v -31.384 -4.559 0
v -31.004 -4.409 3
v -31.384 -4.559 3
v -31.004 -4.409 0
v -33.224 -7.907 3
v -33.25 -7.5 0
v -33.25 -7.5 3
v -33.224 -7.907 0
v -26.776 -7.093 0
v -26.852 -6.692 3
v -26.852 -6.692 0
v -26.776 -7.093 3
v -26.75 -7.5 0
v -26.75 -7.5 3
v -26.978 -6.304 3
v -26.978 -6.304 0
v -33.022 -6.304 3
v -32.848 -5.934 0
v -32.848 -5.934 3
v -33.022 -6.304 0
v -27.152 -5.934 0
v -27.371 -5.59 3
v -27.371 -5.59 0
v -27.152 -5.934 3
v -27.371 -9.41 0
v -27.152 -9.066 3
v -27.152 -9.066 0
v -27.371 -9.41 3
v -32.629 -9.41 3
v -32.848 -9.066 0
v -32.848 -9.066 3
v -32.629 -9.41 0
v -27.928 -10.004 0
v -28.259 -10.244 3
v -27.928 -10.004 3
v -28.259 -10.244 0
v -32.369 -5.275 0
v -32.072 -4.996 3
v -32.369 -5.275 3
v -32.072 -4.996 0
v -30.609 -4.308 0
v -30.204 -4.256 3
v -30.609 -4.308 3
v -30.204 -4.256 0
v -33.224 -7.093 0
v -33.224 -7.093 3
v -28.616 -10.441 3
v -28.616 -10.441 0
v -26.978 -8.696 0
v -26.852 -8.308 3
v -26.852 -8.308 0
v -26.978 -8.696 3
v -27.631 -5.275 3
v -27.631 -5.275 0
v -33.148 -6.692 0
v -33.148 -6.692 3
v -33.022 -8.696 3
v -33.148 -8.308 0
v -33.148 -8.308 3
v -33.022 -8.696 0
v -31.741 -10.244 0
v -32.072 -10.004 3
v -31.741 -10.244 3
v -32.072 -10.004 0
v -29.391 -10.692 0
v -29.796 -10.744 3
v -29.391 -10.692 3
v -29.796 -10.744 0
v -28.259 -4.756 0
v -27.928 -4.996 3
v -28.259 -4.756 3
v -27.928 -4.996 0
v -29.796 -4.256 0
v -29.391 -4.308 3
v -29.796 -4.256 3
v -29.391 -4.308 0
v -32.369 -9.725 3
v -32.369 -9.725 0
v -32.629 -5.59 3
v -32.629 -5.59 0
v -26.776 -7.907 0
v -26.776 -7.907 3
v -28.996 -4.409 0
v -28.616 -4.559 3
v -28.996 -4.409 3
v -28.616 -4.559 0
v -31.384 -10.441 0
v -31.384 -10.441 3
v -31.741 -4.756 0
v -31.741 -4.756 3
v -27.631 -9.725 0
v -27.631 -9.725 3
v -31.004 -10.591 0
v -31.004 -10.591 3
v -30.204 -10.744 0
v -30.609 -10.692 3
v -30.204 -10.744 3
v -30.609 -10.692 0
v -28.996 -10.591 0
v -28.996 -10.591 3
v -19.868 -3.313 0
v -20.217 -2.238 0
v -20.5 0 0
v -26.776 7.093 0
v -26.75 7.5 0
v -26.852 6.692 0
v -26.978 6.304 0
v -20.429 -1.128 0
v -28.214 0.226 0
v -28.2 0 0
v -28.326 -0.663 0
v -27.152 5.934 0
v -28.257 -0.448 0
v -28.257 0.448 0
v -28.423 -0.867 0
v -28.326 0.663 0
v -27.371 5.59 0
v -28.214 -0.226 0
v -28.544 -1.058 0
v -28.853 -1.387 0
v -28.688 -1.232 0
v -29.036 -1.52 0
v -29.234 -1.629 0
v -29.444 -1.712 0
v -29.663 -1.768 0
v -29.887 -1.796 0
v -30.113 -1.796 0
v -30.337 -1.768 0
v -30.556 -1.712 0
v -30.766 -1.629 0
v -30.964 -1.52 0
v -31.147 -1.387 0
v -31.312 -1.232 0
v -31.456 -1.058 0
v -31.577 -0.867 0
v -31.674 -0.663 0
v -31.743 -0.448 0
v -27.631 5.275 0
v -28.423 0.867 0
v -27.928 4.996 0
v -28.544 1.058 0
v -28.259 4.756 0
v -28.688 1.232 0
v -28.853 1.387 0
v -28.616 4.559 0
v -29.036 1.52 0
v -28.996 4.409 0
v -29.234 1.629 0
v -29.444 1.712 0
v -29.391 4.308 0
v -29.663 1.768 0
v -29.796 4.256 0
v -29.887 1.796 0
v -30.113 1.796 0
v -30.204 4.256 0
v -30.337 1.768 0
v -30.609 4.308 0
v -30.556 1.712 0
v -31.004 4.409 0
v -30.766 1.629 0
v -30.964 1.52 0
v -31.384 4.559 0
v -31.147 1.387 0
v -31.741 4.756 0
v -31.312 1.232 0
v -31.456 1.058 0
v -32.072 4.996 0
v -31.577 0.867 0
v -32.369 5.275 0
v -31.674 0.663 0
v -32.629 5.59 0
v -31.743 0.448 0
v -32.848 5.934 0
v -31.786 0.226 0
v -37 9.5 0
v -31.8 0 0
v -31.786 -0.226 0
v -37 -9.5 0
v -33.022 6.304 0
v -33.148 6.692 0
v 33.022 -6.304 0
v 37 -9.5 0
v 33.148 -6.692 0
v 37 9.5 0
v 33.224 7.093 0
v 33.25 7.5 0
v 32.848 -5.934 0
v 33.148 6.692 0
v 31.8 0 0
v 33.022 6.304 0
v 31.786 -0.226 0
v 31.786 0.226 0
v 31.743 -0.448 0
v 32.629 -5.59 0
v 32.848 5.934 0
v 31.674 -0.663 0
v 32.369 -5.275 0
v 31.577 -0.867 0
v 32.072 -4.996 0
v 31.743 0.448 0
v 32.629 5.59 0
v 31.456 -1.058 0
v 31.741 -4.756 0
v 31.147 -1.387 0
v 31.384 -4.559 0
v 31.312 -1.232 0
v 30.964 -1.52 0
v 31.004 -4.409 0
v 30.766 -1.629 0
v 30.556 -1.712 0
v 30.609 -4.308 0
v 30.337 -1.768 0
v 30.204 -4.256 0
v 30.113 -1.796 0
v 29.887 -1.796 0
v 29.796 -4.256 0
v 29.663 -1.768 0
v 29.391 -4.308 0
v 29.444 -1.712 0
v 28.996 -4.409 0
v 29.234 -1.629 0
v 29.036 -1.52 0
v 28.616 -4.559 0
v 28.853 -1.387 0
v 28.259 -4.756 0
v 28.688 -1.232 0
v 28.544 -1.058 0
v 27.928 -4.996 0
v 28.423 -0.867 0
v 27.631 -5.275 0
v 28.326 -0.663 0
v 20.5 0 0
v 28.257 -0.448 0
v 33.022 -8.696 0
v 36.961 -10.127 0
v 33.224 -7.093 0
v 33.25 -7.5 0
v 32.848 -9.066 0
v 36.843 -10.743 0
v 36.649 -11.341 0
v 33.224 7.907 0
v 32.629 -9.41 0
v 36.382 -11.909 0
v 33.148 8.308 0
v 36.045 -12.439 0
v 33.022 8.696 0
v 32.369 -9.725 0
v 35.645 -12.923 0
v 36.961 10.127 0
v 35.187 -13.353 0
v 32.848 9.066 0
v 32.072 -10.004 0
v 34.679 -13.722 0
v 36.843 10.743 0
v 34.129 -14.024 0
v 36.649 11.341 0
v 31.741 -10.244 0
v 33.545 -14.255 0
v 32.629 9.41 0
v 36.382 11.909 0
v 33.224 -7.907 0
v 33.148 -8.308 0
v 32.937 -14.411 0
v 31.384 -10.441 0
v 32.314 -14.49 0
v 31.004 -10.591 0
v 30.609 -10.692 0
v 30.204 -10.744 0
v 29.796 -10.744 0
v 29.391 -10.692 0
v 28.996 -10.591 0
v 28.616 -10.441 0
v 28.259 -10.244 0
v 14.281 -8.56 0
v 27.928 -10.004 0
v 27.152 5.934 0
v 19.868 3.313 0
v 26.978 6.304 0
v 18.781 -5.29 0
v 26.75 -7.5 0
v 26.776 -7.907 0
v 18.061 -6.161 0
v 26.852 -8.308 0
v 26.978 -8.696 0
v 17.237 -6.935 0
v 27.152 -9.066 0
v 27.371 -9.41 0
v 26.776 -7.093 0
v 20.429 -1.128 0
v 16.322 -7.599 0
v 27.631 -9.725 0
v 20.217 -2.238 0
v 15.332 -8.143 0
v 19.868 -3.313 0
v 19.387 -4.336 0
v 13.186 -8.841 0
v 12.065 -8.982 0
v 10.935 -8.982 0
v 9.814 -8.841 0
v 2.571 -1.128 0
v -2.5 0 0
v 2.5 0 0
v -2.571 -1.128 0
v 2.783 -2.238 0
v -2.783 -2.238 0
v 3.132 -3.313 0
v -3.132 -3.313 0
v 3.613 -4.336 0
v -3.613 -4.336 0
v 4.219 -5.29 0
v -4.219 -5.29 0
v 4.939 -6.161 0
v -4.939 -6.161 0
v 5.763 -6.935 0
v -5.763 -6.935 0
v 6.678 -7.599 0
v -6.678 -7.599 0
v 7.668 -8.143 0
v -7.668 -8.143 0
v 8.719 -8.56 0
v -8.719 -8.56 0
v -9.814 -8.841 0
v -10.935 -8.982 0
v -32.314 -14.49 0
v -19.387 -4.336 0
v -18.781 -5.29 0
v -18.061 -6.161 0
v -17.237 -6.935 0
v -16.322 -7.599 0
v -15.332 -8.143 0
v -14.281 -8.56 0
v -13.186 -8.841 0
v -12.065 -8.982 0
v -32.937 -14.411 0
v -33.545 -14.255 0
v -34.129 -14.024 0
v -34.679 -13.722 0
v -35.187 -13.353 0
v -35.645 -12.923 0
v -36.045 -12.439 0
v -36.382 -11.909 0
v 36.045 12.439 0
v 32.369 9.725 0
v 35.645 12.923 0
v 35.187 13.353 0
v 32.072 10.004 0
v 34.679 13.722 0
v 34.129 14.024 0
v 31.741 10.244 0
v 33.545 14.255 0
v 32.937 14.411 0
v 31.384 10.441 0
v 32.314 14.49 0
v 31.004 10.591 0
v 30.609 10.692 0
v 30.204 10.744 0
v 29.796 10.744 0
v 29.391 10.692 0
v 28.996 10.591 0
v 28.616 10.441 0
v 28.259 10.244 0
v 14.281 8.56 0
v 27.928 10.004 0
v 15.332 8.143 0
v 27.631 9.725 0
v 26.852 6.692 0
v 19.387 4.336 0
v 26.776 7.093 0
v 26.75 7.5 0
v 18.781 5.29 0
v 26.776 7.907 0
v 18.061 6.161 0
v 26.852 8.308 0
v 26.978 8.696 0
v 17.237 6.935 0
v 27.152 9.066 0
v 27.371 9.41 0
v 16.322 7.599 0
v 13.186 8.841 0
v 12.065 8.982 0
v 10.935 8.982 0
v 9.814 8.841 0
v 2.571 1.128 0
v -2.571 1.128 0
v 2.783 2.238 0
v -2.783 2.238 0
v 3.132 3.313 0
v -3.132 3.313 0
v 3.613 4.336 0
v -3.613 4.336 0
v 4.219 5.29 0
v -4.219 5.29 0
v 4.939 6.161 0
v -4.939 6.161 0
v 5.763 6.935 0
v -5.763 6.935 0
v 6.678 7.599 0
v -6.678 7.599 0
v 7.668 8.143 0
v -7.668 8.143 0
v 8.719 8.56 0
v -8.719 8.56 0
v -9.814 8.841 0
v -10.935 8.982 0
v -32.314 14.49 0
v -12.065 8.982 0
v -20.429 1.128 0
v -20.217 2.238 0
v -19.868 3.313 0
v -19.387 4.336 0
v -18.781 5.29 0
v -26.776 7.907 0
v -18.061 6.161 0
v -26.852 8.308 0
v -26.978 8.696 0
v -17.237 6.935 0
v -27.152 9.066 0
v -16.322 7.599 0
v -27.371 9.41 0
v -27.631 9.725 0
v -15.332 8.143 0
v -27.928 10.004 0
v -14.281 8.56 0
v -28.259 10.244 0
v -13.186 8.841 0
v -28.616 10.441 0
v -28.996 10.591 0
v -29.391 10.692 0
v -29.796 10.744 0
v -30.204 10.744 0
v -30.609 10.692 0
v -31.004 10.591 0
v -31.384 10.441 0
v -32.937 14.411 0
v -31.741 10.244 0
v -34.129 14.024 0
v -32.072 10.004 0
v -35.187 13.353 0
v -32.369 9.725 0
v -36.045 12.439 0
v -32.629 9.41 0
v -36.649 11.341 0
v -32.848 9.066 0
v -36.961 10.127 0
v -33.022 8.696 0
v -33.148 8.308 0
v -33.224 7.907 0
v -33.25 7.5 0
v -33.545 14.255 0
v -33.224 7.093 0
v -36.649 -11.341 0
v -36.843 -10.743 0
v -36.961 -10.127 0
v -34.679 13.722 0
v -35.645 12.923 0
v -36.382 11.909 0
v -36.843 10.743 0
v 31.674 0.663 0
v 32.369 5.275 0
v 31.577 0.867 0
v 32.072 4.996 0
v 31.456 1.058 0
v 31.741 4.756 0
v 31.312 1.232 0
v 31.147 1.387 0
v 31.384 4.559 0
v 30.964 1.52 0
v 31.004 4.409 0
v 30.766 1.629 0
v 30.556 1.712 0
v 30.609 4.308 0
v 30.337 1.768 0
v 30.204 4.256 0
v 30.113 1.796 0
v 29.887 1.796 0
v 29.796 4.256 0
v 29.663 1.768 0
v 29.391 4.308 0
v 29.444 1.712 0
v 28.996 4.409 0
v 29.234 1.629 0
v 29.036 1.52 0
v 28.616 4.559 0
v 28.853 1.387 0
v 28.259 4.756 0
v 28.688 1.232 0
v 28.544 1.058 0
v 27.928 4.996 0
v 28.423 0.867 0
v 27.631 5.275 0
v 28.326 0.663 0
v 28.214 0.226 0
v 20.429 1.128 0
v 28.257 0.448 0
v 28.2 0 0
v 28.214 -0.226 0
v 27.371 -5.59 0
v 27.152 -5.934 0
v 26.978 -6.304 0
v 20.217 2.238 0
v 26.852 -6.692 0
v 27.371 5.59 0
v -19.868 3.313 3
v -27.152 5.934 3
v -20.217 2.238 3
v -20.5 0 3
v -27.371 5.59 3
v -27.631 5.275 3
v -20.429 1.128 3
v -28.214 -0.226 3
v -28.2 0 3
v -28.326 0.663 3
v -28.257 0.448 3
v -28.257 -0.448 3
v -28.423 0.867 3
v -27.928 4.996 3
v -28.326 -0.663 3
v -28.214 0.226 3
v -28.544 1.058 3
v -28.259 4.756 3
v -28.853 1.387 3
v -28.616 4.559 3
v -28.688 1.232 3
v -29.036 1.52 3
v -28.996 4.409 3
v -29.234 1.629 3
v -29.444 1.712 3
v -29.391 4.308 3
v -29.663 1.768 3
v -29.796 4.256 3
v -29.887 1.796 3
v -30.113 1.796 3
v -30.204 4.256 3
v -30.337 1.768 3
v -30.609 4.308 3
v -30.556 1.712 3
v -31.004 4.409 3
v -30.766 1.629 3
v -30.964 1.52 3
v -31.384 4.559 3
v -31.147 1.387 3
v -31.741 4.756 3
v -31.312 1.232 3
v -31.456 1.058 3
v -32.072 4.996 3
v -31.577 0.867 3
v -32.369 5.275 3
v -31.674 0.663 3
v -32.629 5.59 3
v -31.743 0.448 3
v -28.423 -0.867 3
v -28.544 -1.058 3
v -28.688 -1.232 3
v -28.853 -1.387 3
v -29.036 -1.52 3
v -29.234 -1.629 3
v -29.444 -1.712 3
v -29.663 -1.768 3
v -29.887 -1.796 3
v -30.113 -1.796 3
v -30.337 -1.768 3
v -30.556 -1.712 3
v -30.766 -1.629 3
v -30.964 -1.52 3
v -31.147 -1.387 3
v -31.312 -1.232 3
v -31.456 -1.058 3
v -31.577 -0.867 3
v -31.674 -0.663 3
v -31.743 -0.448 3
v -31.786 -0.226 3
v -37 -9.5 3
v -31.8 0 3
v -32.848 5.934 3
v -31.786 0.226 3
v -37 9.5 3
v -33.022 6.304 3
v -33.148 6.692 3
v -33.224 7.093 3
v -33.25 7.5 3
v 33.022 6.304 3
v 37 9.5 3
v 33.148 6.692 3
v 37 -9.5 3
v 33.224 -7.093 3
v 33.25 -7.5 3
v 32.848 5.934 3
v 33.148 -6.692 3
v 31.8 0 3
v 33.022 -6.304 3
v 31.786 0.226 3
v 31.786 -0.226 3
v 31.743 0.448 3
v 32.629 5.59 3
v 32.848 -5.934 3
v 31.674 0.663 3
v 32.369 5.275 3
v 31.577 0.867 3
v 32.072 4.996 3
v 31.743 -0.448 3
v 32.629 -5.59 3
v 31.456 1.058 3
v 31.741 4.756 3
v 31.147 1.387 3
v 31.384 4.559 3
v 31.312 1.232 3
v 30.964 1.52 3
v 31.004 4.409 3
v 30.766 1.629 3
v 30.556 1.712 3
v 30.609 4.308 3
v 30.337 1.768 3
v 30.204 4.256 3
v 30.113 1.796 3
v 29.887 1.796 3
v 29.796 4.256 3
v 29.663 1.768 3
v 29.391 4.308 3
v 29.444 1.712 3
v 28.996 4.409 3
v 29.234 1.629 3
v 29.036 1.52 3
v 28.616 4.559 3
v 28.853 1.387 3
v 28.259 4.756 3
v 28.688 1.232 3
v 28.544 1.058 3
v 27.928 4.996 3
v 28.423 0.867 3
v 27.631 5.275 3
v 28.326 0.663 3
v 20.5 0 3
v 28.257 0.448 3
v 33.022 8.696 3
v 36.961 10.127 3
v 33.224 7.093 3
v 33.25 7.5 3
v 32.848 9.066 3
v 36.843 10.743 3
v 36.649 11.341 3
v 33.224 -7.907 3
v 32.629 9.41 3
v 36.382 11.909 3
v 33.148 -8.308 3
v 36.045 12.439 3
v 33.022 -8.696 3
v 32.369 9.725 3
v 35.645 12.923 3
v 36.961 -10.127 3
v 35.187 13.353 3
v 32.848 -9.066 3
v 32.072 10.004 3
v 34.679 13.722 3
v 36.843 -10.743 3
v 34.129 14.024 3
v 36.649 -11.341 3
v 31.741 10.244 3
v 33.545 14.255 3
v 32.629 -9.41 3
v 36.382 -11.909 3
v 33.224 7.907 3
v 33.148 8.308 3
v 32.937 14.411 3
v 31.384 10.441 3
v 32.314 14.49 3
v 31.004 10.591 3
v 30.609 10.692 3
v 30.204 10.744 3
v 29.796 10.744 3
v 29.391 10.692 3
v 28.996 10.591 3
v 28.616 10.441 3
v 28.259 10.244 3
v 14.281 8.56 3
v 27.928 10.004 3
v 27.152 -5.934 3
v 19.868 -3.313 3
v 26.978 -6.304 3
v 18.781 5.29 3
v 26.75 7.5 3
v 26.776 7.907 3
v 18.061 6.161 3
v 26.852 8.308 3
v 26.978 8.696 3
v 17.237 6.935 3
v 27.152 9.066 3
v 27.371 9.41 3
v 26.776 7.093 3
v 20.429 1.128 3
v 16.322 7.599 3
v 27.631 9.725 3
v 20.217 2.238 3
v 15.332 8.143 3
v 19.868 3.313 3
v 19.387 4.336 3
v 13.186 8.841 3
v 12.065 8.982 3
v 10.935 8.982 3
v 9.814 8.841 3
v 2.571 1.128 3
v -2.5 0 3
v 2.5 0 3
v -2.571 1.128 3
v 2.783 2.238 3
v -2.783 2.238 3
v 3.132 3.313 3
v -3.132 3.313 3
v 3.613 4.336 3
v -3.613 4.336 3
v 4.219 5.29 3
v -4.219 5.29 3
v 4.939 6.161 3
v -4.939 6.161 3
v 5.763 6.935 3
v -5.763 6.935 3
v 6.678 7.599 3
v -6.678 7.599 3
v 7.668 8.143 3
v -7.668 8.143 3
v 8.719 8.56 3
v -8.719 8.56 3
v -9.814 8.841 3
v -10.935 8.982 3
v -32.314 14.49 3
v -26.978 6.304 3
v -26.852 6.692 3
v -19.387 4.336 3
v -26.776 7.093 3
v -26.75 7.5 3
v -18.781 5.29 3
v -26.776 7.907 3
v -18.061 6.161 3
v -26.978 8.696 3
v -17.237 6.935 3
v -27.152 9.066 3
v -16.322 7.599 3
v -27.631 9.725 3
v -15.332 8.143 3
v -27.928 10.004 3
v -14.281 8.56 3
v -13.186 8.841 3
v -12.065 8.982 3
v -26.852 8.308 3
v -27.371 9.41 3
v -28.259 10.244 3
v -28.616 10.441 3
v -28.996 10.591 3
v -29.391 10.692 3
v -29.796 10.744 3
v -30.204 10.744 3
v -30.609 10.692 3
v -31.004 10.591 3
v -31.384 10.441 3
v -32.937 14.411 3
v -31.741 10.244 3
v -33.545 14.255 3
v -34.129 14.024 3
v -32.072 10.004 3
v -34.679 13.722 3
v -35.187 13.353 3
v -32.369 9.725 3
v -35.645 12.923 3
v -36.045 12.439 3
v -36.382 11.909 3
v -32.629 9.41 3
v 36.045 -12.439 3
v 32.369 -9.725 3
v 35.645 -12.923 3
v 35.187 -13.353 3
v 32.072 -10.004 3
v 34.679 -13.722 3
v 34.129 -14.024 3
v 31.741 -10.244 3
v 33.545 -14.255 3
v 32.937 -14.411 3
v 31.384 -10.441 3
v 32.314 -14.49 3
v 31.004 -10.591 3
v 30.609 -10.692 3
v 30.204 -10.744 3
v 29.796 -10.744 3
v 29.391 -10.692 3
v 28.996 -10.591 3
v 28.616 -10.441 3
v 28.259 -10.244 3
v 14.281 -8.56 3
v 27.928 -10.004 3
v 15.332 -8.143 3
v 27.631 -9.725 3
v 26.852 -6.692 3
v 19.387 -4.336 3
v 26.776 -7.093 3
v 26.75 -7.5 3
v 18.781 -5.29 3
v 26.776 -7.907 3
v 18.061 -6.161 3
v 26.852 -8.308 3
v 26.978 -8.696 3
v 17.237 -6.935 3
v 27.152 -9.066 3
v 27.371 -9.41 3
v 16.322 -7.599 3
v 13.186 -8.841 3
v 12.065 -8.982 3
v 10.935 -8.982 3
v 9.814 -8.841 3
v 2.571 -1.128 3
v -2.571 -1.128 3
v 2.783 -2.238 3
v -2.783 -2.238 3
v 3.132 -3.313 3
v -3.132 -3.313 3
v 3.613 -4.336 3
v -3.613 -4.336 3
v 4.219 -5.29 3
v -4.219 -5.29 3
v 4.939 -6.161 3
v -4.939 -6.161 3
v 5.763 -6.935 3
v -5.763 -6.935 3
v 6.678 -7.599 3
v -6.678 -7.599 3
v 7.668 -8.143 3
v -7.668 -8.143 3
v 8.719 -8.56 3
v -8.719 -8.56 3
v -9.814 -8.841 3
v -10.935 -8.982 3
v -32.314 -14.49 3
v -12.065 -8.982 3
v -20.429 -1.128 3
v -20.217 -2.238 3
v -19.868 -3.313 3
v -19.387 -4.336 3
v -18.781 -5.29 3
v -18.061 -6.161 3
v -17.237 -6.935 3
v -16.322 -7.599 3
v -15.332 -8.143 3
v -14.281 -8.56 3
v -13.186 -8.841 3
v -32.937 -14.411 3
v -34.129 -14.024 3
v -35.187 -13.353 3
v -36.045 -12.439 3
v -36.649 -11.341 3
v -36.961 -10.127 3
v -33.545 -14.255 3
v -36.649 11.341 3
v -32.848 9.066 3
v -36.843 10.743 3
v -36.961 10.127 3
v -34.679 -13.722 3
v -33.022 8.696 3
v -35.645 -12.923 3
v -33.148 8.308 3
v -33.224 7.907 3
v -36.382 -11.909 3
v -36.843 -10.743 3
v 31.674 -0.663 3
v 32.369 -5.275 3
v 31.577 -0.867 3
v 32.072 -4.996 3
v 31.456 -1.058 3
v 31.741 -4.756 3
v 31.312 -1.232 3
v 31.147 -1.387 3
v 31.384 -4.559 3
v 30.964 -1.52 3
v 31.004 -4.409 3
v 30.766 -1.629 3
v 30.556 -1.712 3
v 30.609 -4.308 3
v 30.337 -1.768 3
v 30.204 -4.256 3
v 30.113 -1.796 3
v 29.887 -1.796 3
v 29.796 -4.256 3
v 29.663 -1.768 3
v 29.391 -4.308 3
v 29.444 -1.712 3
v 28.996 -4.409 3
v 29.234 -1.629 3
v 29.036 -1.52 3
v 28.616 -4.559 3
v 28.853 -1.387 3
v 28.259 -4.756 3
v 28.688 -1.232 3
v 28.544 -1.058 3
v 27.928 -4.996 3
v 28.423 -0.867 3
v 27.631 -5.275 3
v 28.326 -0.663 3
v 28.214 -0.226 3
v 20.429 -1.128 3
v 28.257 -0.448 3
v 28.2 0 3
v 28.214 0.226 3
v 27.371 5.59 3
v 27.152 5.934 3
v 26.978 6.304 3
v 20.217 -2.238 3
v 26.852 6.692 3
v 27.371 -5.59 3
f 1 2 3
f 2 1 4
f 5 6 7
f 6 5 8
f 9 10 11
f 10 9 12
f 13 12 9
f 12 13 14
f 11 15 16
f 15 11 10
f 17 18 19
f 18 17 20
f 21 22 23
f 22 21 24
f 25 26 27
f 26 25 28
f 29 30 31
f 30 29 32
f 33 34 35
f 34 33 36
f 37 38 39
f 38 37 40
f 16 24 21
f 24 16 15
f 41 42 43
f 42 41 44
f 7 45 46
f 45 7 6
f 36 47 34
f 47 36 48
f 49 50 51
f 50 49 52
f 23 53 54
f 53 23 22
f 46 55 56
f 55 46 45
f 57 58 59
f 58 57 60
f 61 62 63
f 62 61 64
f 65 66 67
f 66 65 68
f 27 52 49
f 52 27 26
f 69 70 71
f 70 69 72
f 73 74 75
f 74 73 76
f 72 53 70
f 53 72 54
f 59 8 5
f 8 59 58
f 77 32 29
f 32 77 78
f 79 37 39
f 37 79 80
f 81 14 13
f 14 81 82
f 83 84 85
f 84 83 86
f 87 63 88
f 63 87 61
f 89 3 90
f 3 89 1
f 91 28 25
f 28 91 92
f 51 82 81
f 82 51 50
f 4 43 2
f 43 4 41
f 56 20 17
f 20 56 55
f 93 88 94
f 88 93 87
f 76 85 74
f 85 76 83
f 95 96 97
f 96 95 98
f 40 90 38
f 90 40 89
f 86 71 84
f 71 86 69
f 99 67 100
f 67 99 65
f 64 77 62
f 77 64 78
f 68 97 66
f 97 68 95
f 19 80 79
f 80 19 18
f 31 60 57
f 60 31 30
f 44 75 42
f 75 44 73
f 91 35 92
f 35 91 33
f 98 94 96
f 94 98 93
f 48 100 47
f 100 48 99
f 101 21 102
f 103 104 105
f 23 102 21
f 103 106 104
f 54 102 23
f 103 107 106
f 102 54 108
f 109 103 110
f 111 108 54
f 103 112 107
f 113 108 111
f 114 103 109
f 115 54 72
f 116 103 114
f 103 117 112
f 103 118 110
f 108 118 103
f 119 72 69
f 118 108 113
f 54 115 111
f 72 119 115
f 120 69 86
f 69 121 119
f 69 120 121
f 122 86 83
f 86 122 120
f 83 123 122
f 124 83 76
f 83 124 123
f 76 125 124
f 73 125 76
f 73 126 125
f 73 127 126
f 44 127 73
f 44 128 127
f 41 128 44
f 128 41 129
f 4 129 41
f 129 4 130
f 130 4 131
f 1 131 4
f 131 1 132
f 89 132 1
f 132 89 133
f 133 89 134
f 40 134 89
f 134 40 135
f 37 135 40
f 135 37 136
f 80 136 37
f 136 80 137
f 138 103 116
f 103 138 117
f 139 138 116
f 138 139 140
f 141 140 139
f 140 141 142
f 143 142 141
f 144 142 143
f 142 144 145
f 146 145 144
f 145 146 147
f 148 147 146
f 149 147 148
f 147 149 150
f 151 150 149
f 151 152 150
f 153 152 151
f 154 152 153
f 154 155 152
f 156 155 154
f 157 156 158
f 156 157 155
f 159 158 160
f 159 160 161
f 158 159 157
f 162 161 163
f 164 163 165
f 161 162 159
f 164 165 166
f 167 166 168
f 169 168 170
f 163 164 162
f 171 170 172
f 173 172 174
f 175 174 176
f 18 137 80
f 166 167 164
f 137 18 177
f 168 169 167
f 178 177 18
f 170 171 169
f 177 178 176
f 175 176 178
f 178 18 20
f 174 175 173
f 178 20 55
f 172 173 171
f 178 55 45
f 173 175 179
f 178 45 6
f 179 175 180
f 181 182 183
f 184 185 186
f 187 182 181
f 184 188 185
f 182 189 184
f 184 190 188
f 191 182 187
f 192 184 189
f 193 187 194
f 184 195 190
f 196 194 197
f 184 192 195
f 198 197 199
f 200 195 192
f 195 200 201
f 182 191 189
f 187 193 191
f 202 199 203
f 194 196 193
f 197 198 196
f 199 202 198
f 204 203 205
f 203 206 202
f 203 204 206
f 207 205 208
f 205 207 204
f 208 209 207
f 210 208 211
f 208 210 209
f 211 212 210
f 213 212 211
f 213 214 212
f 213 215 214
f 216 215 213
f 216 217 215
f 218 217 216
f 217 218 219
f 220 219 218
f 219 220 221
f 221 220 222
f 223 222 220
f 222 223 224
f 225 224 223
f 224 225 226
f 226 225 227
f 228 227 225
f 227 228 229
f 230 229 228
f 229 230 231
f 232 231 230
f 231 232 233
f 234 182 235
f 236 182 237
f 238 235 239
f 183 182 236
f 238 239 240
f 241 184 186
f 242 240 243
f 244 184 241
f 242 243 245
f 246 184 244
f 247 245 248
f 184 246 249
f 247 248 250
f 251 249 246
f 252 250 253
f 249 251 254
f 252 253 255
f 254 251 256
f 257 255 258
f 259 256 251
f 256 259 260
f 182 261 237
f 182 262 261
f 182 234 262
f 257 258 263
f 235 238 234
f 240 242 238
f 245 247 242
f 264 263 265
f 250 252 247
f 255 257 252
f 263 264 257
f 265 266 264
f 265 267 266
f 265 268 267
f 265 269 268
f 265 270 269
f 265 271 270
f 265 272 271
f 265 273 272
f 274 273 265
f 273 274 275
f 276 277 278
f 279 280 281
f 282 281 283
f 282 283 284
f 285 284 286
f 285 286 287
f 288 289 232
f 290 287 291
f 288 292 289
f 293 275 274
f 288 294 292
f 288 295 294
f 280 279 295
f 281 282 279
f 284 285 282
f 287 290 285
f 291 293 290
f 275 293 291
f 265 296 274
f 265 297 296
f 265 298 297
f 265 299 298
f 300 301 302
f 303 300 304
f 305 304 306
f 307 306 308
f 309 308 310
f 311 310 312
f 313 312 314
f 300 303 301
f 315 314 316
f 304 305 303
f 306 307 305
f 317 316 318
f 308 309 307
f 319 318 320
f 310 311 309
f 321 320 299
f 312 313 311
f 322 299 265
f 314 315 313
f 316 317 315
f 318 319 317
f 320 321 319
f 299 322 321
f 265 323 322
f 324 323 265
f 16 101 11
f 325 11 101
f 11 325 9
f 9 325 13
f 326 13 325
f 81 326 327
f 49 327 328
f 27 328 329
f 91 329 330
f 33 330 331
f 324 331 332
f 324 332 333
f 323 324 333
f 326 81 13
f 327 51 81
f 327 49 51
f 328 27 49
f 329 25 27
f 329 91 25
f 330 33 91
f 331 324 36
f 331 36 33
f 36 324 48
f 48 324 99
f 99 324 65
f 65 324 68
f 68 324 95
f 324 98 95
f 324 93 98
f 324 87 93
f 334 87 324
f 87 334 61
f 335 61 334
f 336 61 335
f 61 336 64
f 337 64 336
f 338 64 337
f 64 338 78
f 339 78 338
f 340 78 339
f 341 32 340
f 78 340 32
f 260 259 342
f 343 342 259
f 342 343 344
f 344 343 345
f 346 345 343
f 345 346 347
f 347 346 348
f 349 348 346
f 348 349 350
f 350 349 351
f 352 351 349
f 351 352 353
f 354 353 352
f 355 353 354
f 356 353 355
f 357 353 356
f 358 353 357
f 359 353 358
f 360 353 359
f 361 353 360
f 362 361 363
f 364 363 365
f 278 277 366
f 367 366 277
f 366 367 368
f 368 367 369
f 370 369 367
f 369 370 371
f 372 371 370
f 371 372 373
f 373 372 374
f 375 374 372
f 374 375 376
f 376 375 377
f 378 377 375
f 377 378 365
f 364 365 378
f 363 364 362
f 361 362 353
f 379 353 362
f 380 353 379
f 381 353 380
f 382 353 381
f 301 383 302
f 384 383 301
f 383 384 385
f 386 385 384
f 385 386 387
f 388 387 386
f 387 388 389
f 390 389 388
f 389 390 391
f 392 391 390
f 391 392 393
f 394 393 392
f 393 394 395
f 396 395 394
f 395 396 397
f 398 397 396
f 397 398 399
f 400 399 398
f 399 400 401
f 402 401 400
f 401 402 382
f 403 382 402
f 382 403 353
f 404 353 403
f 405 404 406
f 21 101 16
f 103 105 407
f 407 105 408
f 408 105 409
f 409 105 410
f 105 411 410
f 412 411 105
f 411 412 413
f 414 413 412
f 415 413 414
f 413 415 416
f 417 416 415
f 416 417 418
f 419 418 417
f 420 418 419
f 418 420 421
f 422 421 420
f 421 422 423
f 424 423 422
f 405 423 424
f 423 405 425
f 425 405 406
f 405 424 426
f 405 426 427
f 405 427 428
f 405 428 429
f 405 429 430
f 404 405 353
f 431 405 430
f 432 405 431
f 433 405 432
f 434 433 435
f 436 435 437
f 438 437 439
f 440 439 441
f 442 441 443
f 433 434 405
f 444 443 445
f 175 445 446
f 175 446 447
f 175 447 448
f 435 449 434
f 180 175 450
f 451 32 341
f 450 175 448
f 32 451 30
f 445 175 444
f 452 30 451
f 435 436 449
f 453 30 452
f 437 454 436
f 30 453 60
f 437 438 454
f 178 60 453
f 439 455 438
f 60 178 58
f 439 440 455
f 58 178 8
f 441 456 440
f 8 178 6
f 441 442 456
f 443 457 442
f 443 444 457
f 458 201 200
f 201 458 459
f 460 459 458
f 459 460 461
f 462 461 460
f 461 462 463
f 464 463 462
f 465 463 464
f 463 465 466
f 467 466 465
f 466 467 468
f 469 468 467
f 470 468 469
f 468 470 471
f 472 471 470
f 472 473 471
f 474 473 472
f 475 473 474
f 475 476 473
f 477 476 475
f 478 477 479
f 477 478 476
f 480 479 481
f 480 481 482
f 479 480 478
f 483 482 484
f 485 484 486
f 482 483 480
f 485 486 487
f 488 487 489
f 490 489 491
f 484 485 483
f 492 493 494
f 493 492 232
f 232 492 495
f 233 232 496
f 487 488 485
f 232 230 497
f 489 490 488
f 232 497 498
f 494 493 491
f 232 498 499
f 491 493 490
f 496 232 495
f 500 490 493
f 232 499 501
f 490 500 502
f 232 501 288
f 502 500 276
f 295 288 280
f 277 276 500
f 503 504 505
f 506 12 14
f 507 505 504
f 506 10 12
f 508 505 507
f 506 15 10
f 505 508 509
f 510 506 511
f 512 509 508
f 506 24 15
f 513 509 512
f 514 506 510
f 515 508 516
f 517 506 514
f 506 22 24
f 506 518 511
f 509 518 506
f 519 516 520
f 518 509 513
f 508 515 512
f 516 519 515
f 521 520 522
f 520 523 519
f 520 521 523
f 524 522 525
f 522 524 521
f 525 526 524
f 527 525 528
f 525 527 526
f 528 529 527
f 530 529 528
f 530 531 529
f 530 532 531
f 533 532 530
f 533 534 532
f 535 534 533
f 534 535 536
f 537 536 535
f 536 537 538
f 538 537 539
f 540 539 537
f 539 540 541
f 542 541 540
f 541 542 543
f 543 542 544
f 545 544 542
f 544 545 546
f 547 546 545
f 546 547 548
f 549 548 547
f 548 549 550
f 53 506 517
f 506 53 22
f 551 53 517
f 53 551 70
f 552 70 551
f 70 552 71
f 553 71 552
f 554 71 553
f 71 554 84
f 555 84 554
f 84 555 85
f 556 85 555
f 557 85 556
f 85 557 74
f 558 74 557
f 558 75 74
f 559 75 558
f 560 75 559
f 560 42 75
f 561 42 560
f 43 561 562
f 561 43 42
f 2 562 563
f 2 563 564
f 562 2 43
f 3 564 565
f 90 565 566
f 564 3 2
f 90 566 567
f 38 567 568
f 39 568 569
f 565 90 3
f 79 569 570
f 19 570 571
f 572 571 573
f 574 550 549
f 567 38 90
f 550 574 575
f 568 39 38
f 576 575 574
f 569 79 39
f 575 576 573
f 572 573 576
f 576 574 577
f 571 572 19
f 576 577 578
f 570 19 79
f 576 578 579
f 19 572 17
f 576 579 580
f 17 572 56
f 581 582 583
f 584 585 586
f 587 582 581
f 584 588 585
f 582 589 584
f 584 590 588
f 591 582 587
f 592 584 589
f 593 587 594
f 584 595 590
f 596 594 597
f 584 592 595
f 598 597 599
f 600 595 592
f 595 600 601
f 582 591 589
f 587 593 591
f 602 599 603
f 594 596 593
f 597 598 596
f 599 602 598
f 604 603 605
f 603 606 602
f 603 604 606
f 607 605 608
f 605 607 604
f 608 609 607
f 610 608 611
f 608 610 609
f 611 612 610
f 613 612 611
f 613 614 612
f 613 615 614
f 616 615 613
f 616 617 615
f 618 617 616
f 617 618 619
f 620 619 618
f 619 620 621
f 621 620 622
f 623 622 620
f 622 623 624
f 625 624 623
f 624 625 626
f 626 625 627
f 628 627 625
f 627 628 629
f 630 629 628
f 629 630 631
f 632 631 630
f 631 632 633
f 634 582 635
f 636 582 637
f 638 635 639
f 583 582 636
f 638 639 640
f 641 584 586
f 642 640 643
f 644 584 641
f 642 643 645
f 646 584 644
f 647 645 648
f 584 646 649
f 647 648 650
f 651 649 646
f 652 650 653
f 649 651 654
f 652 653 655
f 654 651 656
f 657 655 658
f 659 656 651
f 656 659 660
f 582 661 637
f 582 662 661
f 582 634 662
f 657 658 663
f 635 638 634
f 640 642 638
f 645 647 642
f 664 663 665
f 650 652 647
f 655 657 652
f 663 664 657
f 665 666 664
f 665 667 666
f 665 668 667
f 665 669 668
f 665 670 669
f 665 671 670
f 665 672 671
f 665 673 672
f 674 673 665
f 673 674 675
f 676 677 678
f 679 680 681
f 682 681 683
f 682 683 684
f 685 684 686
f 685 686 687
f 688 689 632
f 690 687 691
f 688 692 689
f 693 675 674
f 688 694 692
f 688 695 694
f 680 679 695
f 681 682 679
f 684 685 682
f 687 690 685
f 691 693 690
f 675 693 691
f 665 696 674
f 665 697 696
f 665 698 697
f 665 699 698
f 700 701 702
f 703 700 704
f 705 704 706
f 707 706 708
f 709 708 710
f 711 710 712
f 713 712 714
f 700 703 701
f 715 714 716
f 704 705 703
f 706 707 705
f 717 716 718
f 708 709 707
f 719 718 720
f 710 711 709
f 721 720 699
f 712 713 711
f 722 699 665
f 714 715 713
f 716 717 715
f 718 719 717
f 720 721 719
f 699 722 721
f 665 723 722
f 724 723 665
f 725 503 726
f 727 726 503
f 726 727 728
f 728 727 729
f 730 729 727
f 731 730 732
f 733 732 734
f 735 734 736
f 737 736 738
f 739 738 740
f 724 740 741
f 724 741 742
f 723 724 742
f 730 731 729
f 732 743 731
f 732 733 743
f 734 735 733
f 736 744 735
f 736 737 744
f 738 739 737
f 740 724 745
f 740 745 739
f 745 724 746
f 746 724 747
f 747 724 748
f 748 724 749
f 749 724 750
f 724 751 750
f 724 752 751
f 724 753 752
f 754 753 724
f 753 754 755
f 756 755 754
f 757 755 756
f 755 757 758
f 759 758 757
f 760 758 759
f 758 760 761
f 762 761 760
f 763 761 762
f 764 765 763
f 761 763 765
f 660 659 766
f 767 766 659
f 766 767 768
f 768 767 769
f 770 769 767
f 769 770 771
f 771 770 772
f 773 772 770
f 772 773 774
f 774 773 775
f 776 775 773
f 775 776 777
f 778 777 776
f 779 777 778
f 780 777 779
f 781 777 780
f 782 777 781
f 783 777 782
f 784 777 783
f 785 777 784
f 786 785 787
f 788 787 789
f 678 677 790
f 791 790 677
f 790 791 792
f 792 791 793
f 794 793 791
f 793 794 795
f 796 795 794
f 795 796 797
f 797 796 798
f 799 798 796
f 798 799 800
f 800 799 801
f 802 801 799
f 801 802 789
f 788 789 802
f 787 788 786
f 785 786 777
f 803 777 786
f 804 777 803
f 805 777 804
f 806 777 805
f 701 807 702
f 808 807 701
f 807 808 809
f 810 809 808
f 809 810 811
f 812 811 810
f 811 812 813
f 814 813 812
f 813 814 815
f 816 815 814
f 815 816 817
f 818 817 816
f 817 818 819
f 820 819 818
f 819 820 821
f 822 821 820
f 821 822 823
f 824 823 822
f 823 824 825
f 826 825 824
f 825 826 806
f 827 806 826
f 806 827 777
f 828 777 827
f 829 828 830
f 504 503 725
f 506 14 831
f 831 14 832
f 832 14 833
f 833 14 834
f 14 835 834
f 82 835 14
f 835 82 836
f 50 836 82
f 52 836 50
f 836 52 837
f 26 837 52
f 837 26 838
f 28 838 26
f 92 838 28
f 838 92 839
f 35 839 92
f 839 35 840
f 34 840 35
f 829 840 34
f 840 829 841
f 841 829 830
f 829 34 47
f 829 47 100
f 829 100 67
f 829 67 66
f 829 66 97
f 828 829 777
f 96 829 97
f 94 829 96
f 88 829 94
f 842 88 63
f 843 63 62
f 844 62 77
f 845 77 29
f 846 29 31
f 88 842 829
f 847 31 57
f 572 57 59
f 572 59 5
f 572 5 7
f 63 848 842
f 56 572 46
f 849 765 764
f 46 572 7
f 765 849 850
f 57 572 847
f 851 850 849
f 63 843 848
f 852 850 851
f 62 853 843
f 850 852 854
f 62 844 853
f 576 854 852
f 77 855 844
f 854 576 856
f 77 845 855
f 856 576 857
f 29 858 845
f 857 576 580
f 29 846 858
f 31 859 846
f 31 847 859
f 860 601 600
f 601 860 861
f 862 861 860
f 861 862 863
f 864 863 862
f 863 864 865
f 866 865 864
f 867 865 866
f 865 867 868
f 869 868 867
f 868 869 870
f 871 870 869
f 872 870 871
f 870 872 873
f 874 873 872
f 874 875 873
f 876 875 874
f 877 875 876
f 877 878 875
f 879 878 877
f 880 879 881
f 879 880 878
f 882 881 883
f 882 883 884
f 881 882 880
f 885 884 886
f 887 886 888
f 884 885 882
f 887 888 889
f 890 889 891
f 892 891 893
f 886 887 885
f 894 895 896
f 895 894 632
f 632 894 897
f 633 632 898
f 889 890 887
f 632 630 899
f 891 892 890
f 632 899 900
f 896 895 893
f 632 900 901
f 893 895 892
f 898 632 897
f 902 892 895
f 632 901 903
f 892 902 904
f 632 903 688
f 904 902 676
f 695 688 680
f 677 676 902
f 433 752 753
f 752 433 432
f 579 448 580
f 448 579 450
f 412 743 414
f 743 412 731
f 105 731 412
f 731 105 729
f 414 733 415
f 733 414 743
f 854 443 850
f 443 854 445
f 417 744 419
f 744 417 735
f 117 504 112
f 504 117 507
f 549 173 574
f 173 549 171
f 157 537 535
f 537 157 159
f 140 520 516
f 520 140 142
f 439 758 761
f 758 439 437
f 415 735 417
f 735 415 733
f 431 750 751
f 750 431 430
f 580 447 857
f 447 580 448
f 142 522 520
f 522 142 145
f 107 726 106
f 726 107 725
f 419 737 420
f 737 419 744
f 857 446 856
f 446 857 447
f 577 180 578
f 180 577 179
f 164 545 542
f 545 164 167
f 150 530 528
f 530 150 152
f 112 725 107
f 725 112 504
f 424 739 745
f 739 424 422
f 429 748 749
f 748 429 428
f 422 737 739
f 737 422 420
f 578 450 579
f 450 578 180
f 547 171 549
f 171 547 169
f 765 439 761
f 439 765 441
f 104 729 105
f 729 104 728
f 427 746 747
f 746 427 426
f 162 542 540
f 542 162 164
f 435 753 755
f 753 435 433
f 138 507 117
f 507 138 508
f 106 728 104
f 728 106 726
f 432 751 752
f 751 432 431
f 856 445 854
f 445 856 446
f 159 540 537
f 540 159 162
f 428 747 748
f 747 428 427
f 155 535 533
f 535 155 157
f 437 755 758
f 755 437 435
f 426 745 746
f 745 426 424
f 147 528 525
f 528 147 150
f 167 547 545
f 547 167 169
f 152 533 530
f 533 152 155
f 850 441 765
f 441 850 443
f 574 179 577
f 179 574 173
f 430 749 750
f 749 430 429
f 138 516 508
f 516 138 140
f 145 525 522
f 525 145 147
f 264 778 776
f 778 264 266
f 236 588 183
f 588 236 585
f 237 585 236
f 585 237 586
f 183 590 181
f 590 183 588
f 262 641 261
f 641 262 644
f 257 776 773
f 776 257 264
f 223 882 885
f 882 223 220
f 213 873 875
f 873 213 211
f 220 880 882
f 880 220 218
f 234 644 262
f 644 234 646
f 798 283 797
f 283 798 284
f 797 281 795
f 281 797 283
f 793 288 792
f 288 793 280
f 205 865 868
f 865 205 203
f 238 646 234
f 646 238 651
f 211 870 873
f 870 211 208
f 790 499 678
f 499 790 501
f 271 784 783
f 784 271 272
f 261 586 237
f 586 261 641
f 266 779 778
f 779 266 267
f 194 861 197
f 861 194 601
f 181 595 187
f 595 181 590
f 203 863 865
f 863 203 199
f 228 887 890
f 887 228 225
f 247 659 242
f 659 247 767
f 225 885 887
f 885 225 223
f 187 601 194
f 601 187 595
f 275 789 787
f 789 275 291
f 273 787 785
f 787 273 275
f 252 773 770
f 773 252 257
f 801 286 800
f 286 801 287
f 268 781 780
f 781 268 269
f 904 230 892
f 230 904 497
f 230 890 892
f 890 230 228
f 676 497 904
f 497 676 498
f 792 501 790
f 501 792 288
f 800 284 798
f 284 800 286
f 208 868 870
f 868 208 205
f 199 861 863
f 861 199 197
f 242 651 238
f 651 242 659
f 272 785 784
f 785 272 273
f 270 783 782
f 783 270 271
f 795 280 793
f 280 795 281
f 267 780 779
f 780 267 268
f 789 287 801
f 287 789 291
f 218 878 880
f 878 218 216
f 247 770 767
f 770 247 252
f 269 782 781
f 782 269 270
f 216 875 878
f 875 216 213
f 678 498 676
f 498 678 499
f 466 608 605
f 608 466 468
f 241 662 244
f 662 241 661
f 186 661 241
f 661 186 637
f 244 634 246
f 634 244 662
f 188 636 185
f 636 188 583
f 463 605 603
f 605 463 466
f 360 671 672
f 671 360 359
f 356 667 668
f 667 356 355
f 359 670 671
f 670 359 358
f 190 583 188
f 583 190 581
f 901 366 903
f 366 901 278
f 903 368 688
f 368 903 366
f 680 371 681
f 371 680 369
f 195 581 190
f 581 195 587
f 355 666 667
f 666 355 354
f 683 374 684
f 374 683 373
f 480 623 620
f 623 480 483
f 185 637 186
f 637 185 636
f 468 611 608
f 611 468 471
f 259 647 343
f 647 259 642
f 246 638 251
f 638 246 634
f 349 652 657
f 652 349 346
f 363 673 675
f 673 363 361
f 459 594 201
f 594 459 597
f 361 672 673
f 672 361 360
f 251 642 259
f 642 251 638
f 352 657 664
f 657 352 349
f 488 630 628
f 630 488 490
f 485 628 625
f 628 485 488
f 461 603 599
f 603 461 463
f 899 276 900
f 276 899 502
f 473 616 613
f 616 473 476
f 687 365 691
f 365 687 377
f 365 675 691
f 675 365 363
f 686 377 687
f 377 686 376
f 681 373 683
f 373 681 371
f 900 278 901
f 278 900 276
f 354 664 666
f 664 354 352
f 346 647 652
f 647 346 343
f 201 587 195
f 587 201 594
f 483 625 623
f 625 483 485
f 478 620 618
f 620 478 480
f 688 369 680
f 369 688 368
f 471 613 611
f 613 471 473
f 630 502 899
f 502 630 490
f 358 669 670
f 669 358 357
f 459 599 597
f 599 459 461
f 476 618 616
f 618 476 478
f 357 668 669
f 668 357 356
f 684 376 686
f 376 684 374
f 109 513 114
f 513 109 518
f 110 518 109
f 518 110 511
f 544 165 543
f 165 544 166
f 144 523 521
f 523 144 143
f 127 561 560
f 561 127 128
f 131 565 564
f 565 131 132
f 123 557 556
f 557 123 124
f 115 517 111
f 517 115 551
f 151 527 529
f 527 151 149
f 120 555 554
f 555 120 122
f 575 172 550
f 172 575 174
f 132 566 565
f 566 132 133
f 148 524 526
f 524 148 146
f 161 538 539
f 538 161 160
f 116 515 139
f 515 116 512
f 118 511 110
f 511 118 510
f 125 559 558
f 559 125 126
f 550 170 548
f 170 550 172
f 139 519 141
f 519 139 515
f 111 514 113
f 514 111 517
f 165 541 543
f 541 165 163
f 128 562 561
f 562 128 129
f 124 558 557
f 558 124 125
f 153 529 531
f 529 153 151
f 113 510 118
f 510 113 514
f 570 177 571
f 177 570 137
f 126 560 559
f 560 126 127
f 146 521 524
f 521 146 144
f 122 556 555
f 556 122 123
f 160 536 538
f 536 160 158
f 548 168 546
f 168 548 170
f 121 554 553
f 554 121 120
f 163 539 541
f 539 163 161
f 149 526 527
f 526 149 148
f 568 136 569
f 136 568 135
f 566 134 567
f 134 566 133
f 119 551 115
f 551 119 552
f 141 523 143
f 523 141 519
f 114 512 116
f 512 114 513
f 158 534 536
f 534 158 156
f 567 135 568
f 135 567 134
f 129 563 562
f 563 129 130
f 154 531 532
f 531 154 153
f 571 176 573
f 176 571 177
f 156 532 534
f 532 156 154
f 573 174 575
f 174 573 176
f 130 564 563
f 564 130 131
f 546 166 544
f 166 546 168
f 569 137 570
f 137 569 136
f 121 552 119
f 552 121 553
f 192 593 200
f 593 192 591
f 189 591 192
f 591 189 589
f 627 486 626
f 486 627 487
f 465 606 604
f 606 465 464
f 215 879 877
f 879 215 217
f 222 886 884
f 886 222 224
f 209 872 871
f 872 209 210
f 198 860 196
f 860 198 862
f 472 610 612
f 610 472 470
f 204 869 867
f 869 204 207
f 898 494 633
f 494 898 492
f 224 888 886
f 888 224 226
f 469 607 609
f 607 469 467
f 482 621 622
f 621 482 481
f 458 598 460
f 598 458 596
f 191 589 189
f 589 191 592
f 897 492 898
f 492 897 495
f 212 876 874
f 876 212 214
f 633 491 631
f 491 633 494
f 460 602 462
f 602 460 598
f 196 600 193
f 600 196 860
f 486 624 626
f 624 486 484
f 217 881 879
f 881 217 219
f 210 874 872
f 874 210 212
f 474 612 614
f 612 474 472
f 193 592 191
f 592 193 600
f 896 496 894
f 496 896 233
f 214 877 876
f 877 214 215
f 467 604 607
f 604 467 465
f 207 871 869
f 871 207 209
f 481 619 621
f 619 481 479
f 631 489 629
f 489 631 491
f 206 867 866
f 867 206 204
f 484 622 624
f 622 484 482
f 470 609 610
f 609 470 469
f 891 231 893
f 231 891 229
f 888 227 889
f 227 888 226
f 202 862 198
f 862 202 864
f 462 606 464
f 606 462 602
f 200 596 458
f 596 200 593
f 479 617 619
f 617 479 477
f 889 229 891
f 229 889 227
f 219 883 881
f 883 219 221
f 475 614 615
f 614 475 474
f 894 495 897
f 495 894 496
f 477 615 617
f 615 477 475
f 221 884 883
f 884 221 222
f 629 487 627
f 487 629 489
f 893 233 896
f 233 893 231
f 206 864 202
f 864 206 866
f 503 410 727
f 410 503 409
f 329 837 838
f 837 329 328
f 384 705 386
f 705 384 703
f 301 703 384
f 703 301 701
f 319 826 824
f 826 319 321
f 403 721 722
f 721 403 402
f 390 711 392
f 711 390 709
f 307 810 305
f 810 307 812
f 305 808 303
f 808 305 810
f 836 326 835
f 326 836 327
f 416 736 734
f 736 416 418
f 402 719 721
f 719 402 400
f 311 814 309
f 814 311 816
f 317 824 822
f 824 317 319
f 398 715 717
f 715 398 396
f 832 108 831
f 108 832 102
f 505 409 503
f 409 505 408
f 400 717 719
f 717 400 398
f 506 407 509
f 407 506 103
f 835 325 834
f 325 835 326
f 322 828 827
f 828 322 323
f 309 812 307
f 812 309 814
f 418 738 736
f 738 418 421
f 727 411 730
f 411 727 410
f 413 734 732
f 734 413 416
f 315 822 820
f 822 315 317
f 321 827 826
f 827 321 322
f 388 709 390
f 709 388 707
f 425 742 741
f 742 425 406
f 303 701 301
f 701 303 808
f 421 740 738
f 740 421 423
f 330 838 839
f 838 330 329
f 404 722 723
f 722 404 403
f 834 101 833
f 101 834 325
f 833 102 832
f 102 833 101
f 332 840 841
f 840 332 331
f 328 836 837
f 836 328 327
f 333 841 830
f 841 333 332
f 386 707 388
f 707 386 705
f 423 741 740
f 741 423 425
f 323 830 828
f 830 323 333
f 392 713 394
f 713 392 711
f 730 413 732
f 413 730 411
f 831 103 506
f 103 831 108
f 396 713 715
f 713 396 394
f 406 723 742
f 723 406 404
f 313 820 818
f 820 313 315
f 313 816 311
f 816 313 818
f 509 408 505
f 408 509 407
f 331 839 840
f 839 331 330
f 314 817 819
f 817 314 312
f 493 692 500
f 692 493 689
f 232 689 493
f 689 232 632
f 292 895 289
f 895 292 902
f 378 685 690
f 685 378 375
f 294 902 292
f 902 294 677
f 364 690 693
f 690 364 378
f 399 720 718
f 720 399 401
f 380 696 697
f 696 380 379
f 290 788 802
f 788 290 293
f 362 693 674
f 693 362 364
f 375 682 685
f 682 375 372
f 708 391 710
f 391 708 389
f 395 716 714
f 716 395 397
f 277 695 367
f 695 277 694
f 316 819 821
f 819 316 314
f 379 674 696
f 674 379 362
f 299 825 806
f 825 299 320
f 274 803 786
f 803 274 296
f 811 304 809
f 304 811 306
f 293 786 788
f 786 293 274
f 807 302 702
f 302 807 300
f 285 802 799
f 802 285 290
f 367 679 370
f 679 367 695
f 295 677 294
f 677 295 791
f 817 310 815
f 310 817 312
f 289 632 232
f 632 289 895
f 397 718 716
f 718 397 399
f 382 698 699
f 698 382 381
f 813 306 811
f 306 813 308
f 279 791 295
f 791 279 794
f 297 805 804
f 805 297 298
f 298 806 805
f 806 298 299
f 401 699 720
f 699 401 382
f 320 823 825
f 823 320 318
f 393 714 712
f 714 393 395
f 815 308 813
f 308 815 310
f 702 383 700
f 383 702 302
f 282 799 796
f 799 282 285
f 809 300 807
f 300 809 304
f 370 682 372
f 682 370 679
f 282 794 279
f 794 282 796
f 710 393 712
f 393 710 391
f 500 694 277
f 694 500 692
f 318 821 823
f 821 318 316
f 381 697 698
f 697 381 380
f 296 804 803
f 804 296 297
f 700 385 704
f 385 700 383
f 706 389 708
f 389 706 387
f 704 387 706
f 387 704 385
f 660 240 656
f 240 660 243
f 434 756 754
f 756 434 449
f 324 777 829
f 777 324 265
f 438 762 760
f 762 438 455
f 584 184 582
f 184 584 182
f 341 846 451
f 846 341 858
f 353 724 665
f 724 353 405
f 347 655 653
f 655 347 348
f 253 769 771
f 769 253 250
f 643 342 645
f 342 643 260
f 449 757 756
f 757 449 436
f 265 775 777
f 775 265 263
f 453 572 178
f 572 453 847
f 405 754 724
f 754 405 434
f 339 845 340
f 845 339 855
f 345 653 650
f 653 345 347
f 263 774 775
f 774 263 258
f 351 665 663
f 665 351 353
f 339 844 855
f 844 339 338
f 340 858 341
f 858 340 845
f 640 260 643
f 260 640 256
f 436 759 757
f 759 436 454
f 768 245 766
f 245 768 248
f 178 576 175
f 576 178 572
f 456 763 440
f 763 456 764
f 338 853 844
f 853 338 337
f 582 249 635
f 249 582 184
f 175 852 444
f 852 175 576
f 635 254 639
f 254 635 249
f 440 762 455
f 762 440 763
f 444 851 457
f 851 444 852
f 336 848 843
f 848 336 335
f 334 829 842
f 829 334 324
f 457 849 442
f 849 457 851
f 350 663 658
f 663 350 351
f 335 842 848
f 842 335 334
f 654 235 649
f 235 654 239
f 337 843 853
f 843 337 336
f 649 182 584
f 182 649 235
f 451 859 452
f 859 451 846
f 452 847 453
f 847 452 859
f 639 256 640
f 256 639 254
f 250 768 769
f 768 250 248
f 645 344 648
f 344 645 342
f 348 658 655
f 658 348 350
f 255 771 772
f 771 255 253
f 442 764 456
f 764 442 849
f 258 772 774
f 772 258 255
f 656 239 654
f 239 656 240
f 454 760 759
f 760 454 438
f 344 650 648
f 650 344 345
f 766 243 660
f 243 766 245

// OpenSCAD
$fn = 50;

difference() {
	union() {
		hull() {
			translate(v = [-32.0, 9.5, 0]) {
				cylinder(h = 3, r = 5);
			}
			translate(v = [32.0, 9.5, 0]) {
				cylinder(h = 3, r = 5);
			}
			translate(v = [-32.0, -9.5, 0]) {
				cylinder(h = 3, r = 5);
			}
			translate(v = [32.0, -9.5, 0]) {
				cylinder(h = 3, r = 5);
			}
		}
	}
	union() {
		translate(v = [-30.0, -7.5, 0]) {
			cylinder(h = 3, r = 3.25);
		}
		translate(v = [-30.0, 7.5, 0]) {
			cylinder(h = 3, r = 3.25);
		}
		translate(v = [30.0, -7.5, 0]) {
			cylinder(h = 3, r = 3.25);
		}
		translate(v = [30.0, 7.5, 0]) {
			cylinder(h = 3, r = 3.25);
		}
		translate(v = [-30.0, 0.0, 0]) {
			cylinder(h = 3, r = 1.8);
		}
		translate(v = [30.0, 0.0, 0]) {
			cylinder(h = 3, r = 1.8);
		}
		translate(v = [-11.5, 0, 0.0]) {
			cylinder(h = 3, r = 9.0);
		}
		translate(v = [11.5, 0, 0.0]) {
			cylinder(h = 3, r = 9.0);
		}
	}
}
